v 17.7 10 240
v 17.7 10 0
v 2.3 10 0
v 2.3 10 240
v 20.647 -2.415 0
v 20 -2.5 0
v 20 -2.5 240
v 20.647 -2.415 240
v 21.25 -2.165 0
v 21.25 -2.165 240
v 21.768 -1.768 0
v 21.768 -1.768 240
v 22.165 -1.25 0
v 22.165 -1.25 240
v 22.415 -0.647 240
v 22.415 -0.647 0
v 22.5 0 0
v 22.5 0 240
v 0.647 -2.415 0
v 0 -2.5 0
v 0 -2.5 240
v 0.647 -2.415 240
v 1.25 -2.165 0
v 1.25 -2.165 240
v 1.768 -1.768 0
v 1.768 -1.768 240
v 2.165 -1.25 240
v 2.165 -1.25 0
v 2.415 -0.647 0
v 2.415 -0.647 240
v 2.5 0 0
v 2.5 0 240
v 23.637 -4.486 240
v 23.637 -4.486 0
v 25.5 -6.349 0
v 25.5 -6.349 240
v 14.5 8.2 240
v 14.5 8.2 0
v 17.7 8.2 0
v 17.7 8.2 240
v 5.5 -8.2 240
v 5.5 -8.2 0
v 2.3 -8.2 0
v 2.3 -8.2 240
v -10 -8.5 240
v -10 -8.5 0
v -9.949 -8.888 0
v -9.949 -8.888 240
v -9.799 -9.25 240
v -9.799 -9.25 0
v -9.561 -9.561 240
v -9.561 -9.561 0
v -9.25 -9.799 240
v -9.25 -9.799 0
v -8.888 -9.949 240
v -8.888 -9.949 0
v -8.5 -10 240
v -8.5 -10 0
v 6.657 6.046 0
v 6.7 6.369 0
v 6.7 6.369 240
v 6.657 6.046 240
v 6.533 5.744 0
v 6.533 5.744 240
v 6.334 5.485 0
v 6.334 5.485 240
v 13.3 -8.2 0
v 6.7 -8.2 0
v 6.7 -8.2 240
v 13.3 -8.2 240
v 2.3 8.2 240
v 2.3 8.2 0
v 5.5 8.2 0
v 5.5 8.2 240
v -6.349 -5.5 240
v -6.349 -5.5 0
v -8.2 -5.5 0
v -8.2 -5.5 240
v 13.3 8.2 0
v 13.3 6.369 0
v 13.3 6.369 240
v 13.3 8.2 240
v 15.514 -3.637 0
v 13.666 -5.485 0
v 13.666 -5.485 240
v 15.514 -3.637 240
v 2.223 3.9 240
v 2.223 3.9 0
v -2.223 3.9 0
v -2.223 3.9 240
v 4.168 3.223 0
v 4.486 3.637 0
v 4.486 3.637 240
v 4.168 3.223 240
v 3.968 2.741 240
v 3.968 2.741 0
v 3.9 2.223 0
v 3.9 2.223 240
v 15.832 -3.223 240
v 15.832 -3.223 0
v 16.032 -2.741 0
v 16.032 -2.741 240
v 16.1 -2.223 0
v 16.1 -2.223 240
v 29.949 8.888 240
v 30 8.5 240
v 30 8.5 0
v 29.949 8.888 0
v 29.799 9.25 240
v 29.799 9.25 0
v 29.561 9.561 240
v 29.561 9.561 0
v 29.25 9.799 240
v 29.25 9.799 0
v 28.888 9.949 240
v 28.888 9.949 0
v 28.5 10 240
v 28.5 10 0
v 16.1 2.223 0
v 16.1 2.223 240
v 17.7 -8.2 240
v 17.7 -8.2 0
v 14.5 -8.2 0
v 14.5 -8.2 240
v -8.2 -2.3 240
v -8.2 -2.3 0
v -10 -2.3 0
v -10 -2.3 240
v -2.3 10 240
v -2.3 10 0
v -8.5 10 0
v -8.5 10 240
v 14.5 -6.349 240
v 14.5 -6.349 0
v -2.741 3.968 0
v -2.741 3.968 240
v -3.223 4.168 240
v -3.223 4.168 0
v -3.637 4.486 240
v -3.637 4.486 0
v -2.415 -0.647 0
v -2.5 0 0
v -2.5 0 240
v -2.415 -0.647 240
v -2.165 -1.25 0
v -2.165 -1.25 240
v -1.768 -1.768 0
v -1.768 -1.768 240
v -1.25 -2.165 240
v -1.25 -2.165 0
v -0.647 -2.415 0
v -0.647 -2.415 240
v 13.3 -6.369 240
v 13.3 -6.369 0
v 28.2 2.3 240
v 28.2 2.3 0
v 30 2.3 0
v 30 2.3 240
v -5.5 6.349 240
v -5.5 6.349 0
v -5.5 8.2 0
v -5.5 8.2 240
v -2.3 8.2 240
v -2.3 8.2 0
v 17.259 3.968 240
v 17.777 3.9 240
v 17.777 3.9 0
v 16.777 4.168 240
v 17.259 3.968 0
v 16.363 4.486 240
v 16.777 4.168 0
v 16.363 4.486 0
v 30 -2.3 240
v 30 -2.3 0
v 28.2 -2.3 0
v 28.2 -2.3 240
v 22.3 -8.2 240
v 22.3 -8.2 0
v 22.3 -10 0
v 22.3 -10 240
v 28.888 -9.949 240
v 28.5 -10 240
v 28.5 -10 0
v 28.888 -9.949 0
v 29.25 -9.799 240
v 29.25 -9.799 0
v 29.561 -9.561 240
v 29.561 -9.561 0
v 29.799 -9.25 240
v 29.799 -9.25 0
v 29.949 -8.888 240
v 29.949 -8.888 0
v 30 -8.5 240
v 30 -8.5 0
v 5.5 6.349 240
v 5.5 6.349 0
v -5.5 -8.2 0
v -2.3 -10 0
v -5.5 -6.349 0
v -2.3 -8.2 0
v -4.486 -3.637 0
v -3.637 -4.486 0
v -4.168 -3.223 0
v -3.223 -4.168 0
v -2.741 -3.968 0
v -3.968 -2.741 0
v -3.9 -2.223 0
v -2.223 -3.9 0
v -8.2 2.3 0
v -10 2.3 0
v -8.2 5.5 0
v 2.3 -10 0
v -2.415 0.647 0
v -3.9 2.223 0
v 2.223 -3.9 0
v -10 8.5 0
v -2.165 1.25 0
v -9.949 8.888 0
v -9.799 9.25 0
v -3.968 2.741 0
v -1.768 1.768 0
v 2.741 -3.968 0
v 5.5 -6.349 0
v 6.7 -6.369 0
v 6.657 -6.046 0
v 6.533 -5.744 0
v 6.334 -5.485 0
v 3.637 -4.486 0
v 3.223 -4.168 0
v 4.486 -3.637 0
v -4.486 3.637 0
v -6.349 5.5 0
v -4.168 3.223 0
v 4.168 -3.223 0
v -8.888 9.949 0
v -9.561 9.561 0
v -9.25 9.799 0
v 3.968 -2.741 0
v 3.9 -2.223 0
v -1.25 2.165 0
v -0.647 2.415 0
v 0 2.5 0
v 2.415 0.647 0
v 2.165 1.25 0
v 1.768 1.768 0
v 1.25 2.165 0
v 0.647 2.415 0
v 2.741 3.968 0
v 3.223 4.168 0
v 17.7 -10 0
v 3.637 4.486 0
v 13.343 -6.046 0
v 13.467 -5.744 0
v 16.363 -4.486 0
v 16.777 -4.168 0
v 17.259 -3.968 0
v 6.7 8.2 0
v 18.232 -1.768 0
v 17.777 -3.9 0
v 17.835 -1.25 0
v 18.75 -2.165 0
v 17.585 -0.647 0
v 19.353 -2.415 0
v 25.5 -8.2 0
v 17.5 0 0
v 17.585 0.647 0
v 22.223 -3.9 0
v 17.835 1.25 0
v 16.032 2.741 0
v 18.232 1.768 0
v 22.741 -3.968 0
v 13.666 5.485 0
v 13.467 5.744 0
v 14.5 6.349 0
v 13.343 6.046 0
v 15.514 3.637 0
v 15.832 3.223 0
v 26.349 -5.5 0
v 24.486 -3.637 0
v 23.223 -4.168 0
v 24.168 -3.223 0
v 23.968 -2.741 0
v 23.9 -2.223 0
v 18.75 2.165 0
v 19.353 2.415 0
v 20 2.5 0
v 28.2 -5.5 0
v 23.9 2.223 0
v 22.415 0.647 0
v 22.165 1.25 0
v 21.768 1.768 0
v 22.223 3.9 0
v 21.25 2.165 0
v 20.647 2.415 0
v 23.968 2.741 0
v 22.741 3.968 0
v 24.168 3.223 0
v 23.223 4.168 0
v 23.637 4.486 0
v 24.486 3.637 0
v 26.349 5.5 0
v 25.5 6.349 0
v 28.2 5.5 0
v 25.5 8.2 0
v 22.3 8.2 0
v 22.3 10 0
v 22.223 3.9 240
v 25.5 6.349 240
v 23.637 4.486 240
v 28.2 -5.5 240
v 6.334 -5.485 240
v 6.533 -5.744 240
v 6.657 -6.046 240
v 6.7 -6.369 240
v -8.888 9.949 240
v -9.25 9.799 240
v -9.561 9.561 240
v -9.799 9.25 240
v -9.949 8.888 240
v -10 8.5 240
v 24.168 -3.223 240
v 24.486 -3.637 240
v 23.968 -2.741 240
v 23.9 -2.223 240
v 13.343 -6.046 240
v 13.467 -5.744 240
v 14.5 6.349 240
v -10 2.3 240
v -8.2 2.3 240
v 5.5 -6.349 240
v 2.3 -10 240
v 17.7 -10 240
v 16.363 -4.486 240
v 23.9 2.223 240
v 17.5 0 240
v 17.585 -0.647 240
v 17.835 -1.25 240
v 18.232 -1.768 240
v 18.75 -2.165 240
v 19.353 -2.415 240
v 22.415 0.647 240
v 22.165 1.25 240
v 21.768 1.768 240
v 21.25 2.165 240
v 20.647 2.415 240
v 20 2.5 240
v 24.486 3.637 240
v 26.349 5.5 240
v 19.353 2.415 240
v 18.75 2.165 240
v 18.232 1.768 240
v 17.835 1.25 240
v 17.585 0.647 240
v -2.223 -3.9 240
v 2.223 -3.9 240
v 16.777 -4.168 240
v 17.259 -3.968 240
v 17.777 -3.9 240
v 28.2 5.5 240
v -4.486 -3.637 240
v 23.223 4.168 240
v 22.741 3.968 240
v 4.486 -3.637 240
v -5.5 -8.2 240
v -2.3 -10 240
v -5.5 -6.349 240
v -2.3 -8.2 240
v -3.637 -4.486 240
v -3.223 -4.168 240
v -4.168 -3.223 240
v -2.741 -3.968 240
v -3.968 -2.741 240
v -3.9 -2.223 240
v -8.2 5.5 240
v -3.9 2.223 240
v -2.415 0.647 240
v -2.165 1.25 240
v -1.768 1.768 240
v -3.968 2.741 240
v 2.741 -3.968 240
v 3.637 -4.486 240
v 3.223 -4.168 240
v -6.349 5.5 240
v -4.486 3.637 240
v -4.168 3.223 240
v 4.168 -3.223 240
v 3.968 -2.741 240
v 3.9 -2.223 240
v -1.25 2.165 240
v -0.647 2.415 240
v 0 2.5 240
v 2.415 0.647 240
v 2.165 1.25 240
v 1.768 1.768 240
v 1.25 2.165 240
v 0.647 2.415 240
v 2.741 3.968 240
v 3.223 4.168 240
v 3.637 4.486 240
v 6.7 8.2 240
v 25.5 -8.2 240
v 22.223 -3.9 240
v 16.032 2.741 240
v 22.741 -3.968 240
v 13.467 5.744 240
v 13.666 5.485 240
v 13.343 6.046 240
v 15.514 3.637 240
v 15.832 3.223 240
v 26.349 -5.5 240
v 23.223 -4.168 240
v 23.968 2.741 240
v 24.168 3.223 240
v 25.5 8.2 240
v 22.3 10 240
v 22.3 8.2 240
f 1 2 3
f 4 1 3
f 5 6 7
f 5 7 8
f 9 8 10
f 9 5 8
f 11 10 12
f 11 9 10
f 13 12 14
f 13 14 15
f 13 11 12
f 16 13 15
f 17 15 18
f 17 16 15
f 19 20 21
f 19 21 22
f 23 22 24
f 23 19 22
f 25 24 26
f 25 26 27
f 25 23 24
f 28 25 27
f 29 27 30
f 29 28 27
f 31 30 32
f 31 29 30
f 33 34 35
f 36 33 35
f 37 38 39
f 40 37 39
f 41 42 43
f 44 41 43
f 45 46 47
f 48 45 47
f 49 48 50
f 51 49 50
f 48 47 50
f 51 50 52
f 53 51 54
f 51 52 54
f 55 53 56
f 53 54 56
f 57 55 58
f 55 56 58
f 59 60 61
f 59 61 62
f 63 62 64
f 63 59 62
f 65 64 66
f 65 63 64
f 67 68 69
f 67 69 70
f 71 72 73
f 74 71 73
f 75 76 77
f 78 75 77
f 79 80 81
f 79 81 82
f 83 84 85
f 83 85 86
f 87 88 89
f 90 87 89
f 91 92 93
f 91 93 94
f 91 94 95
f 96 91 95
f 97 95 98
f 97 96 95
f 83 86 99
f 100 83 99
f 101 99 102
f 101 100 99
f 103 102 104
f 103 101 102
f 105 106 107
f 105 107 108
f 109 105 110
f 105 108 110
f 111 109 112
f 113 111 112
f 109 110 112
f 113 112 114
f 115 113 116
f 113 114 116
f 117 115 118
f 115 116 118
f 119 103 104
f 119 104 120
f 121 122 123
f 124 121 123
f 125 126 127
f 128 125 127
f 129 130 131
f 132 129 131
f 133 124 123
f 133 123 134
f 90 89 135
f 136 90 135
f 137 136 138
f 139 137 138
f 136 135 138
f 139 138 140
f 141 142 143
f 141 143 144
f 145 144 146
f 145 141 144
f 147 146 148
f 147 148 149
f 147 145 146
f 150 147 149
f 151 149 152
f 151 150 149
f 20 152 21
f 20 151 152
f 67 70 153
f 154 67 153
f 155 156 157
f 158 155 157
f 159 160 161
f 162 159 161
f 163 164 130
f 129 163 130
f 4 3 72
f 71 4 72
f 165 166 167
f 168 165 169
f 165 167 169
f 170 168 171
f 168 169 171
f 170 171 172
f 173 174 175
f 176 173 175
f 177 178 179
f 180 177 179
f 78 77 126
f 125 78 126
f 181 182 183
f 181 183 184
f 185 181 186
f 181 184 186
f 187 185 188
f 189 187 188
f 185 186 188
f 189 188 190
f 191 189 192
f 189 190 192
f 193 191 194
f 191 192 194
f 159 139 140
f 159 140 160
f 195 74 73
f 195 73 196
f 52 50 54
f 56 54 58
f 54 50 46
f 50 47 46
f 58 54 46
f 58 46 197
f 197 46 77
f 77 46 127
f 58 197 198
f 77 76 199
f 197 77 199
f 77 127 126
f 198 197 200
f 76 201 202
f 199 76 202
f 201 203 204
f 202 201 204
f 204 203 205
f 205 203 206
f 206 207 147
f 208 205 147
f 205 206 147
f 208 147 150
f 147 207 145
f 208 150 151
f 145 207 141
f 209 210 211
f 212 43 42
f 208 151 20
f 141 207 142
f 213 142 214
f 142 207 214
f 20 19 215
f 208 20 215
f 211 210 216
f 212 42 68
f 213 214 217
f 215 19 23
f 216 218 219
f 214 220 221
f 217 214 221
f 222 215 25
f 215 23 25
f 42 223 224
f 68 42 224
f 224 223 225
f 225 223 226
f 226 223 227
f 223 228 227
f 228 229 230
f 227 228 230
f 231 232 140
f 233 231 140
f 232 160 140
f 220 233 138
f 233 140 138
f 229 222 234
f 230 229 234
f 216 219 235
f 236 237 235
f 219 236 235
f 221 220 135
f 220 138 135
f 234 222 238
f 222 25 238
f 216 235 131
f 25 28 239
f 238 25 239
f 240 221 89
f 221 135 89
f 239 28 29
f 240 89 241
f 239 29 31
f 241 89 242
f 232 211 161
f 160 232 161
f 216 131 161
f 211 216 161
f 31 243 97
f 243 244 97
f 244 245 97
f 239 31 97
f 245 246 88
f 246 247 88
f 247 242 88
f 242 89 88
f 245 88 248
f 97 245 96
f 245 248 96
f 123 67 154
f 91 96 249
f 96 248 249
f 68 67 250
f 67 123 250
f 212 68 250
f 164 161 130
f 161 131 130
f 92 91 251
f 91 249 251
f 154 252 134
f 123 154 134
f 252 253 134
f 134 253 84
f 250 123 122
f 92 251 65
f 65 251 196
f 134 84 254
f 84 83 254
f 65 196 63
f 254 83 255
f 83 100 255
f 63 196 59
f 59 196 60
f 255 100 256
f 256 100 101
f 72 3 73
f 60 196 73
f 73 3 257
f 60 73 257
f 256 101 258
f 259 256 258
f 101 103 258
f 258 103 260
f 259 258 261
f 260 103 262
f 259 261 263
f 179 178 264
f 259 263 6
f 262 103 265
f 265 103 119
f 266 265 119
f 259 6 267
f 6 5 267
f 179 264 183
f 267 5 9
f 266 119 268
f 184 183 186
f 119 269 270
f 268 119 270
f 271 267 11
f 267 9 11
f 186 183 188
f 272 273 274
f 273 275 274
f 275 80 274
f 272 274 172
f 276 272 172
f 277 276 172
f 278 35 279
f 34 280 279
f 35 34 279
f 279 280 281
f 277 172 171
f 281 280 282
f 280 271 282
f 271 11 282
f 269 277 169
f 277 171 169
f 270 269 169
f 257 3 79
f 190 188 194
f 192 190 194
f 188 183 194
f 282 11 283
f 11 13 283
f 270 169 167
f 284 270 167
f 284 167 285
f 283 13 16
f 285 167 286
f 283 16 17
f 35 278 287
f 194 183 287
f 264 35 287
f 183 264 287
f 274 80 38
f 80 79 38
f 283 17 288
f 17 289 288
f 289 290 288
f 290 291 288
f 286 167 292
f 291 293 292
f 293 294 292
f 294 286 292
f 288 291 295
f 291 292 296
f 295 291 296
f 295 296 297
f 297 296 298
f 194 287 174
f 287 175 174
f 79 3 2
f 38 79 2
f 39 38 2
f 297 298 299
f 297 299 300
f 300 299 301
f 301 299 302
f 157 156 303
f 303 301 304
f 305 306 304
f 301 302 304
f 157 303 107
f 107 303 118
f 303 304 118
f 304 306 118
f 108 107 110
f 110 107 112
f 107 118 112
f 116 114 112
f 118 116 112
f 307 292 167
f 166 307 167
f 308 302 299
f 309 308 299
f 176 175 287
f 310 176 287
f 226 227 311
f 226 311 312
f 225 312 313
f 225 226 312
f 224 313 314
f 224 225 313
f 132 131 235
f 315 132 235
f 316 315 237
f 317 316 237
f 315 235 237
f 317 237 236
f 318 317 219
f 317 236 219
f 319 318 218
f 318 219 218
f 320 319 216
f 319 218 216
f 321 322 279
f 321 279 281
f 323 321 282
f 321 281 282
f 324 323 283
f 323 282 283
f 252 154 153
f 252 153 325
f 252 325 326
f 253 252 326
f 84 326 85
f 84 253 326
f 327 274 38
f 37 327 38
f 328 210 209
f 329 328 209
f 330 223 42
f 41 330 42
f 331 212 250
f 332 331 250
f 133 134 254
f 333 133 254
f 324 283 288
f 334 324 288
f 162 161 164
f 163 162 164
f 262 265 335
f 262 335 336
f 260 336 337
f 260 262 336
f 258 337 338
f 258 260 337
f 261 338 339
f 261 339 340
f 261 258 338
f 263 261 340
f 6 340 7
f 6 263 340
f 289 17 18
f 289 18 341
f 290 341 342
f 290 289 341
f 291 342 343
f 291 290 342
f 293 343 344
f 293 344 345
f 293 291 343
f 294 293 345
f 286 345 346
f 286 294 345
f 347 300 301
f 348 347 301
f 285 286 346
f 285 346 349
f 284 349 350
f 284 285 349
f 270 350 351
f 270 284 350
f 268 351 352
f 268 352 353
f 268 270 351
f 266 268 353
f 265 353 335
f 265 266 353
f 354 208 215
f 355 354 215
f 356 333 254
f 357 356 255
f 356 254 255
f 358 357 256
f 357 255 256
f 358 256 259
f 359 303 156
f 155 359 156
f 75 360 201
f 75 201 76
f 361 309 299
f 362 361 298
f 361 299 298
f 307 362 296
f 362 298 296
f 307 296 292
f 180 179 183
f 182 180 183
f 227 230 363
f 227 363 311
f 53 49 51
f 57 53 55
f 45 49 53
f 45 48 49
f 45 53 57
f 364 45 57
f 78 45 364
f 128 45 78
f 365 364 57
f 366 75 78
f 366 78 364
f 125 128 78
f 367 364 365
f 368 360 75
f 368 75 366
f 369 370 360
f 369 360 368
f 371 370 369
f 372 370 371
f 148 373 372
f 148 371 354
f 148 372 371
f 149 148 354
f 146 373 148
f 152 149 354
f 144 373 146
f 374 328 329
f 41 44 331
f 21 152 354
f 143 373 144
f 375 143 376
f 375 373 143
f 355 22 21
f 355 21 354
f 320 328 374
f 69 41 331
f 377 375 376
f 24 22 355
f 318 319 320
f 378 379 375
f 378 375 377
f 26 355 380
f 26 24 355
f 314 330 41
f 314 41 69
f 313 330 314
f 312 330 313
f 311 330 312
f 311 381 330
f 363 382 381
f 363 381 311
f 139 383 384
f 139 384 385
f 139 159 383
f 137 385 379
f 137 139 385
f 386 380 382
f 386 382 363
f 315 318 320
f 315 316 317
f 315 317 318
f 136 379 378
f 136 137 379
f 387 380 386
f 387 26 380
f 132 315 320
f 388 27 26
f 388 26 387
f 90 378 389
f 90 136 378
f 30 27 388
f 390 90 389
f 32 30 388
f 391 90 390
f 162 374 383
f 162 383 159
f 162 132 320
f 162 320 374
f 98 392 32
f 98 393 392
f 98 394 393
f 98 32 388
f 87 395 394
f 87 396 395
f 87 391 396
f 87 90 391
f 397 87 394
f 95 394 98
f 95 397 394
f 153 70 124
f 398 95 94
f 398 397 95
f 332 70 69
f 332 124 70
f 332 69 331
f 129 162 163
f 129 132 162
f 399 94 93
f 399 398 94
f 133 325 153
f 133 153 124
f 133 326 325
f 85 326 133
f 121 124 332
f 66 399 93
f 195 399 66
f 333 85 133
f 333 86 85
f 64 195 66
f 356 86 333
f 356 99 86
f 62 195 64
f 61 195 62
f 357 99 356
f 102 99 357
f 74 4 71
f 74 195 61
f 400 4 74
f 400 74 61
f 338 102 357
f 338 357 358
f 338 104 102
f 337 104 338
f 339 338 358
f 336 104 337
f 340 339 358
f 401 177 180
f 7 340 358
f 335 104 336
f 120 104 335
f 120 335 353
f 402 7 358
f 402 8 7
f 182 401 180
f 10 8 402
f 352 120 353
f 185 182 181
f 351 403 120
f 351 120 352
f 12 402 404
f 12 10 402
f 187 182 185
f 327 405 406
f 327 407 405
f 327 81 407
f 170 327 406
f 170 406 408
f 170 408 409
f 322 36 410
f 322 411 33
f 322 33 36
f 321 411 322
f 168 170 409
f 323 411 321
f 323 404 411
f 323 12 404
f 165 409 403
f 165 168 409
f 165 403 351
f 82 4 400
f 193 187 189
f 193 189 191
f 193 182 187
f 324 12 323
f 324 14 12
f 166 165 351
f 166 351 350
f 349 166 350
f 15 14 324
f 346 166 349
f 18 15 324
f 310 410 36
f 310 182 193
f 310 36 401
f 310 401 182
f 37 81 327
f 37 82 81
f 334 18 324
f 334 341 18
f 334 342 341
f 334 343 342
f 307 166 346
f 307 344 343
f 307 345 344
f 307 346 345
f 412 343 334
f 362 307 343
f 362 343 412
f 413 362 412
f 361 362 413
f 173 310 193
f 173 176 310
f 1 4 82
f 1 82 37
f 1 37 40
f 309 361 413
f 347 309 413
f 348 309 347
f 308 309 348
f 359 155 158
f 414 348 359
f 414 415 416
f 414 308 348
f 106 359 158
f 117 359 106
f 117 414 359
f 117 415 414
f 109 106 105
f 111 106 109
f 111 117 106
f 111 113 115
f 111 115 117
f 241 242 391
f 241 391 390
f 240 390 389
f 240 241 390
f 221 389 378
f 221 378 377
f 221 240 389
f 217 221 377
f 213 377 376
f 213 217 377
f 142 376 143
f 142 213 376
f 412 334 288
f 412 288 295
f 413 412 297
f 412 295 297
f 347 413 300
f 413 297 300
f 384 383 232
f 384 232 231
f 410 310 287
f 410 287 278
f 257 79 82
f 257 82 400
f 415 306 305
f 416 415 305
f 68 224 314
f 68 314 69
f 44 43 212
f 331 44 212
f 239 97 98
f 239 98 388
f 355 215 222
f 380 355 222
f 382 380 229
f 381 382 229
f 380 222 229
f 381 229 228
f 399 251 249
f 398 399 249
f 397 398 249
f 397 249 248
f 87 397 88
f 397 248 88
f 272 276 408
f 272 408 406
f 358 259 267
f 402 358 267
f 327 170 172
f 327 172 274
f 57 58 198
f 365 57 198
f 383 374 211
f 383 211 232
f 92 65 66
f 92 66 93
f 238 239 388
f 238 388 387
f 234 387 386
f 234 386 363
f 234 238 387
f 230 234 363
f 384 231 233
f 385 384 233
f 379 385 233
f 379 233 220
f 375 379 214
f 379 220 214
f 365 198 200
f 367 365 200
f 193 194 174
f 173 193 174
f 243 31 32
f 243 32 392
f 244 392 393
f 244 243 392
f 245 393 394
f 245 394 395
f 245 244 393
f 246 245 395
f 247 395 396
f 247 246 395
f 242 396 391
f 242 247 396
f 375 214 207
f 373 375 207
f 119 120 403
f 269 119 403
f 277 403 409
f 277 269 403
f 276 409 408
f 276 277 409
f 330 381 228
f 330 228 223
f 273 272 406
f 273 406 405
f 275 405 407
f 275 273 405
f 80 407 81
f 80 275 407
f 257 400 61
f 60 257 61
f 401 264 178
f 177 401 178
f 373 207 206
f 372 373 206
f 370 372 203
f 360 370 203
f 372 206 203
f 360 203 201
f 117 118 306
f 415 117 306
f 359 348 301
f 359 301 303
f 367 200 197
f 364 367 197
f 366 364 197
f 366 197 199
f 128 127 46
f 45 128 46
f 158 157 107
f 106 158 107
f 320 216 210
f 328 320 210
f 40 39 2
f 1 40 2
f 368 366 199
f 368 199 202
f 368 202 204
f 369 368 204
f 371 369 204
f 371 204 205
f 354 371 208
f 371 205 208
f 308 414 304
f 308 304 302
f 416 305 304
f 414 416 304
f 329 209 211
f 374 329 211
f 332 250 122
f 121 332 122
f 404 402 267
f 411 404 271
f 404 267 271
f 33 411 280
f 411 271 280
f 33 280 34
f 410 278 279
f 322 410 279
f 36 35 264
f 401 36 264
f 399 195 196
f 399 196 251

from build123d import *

# Parameters (mm, degrees)
SALIENTE_EXTRUIR1_DEPTH = 240


with BuildPart() as part:
    # Croquis1 → Saliente-Extruir1 (new body)
    with BuildSketch(Plane.XY):
        with BuildLine():
            Line((-10, 8.5), (-10, 2.3))
            Line((-10, 2.3), (-8.2, 2.3))
            Line((-8.2, 2.3), (-8.2, 5.5))
            Line((-8.2, 5.5), (-6.348528137, 5.5))
            Line((-6.348528137, 5.5), (-4.485786438, 3.6372583))
            ThreePointArc((-4.485786438, 3.6372583), (-4.052240935, 2.988411603), (-3.9, 2.223044738))
            Line((-3.9, 2.223044738), (-3.9, 0))
            Line((-3.9, 0), (-3.9, -2.223044738))
            ThreePointArc((-3.9, -2.223044738), (-4.052240935, -2.988411603), (-4.485786438, -3.6372583))
            Line((-4.485786438, -3.6372583), (-6.348528137, -5.5))
            Line((-6.348528137, -5.5), (-8.2, -5.5))
            Line((-8.2, -5.5), (-8.2, -2.3))
            Line((-8.2, -2.3), (-10, -2.3))
            Line((-10, -2.3), (-10, -8.5))
            ThreePointArc((-10, -8.5), (-9.560660172, -9.560660172), (-8.5, -10))
            Line((-8.5, -10), (-2.3, -10))
            Line((-2.3, -10), (-2.3, -8.2))
            Line((-2.3, -8.2), (-5.5, -8.2))
            Line((-5.5, -8.2), (-5.5, -6.348528137))
            Line((-5.5, -6.348528137), (-3.6372583, -4.485786438))
            ThreePointArc((-3.6372583, -4.485786438), (-2.988411603, -4.052240935), (-2.223044738, -3.9))
            Line((-2.223044738, -3.9), (0, -3.9))
            Line((0, -3.9), (2.223044738, -3.9))
            ThreePointArc((2.223044738, -3.9), (2.988411603, -4.052240935), (3.6372583, -4.485786438))
            Line((3.6372583, -4.485786438), (5.5, -6.348528137))
            Line((5.5, -6.348528137), (5.5, -8.2))
            Line((5.5, -8.2), (2.3, -8.2))
            Line((2.3, -8.2), (2.3, -10))
            Line((2.3, -10), (17.7, -10))
            Line((17.7, -10), (17.7, -8.2))
            Line((17.7, -8.2), (14.5, -8.2))
            Line((14.5, -8.2), (14.5, -6.348528137))
            Line((14.5, -6.348528137), (16.3627417, -4.485786438))
            ThreePointArc((16.3627417, -4.485786438), (17.011588397, -4.052240935), (17.776955262, -3.9))
            Line((17.776955262, -3.9), (20, -3.9))
            Line((20, -3.9), (22.223044738, -3.9))
            ThreePointArc((22.223044738, -3.9), (22.988411603, -4.052240935), (23.6372583, -4.485786438))
            Line((23.6372583, -4.485786438), (25.5, -6.348528137))
            Line((25.5, -6.348528137), (25.5, -8.2))
            Line((25.5, -8.2), (22.3, -8.2))
            Line((22.3, -8.2), (22.3, -10))
            Line((22.3, -10), (28.5, -10))
            ThreePointArc((28.5, -10), (29.560660172, -9.560660172), (30, -8.5))
            Line((30, -8.5), (30, -2.3))
            Line((30, -2.3), (28.2, -2.3))
            Line((28.2, -2.3), (28.2, -5.5))
            Line((28.2, -5.5), (26.348528137, -5.5))
            Line((26.348528137, -5.5), (24.485786438, -3.6372583))
            ThreePointArc((24.485786438, -3.6372583), (24.052240935, -2.988411603), (23.9, -2.223044738))
            Line((23.9, -2.223044738), (23.9, 0))
            Line((23.9, 0), (23.9, 2.223044738))
            ThreePointArc((23.9, 2.223044738), (24.052240935, 2.988411603), (24.485786438, 3.6372583))
            Line((24.485786438, 3.6372583), (26.348528137, 5.5))
            Line((26.348528137, 5.5), (28.2, 5.5))
            Line((28.2, 5.5), (28.2, 2.3))
            Line((28.2, 2.3), (30, 2.3))
            Line((30, 2.3), (30, 8.5))
            ThreePointArc((30, 8.5), (29.560660172, 9.560660172), (28.5, 10))
            Line((28.5, 10), (22.3, 10))
            Line((22.3, 10), (22.3, 8.2))
            Line((22.3, 8.2), (25.5, 8.2))
            Line((25.5, 8.2), (25.5, 6.348528137))
            Line((25.5, 6.348528137), (23.6372583, 4.485786438))
            ThreePointArc((23.6372583, 4.485786438), (22.988411603, 4.052240935), (22.223044738, 3.9))
            Line((22.223044738, 3.9), (20, 3.9))
            Line((20, 3.9), (17.776955262, 3.9))
            ThreePointArc((17.776955262, 3.9), (17.011588397, 4.052240935), (16.3627417, 4.485786438))
            Line((16.3627417, 4.485786438), (14.5, 6.348528137))
            Line((14.5, 6.348528137), (14.5, 8.2))
            Line((14.5, 8.2), (17.7, 8.2))
            Line((17.7, 8.2), (17.7, 10))
            Line((17.7, 10), (2.3, 10))
            Line((2.3, 10), (2.3, 8.2))
            Line((2.3, 8.2), (5.5, 8.2))
            Line((5.5, 8.2), (5.5, 6.348528137))
            Line((5.5, 6.348528137), (3.6372583, 4.485786438))
            ThreePointArc((3.6372583, 4.485786438), (2.988411603, 4.052240935), (2.223044738, 3.9))
            Line((2.223044738, 3.9), (0, 3.9))
            Line((0, 3.9), (-2.223044738, 3.9))
            ThreePointArc((-2.223044738, 3.9), (-2.988411603, 4.052240935), (-3.6372583, 4.485786438))
            Line((-3.6372583, 4.485786438), (-5.5, 6.348528137))
            Line((-5.5, 6.348528137), (-5.5, 8.2))
            Line((-5.5, 8.2), (-2.3, 8.2))
            Line((-2.3, 8.2), (-2.3, 10))
            Line((-2.3, 10), (-8.5, 10))
            ThreePointArc((-8.5, 10), (-9.560660172, 9.560660172), (-10, 8.5))
        make_face()
        with BuildLine():
            Line((3.9, 2.223044738), (3.9, 0))
            Line((3.9, 0), (3.9, -2.223044738))
            ThreePointArc((3.9, -2.223044738), (4.052240935, -2.988411603), (4.485786438, -3.6372583))
            Line((4.485786438, -3.6372583), (6.333883476, -5.485355339))
            ThreePointArc((6.333883476, -5.485355339), (6.604849416, -5.890884525), (6.7, -6.369238816))
            Line((6.7, -6.369238816), (6.7, -8.2))
            Line((6.7, -8.2), (13.3, -8.2))
            Line((13.3, -8.2), (13.3, -6.369238816))
            ThreePointArc((13.3, -6.369238816), (13.395150584, -5.890884525), (13.666116524, -5.485355339))
            Line((13.666116524, -5.485355339), (15.514213562, -3.6372583))
            ThreePointArc((15.514213562, -3.6372583), (15.947759065, -2.988411603), (16.1, -2.223044738))
            Line((16.1, -2.223044738), (16.1, 0))
            Line((16.1, 0), (16.1, 2.223044738))
            ThreePointArc((16.1, 2.223044738), (15.947759065, 2.988411603), (15.514213562, 3.6372583))
            Line((15.514213562, 3.6372583), (13.666116524, 5.485355339))
            ThreePointArc((13.666116524, 5.485355339), (13.395150584, 5.890884525), (13.3, 6.369238816))
            Line((13.3, 6.369238816), (13.3, 8.2))
            Line((13.3, 8.2), (6.7, 8.2))
            Line((6.7, 8.2), (6.7, 6.369238816))
            ThreePointArc((6.7, 6.369238816), (6.604849416, 5.890884525), (6.333883476, 5.485355339))
            Line((6.333883476, 5.485355339), (4.485786438, 3.6372583))
            ThreePointArc((4.485786438, 3.6372583), (4.052240935, 2.988411603), (3.9, 2.223044738))
        make_face(mode=Mode.SUBTRACT)
        with BuildLine():
            ThreePointArc((0, 2.5), (-1.767766953, 1.767766953), (-2.5, 0))
            ThreePointArc((-2.5, 0), (-1.767766953, -1.767766953), (0, -2.5))
            ThreePointArc((0, -2.5), (1.767766953, -1.767766953), (2.5, 0))
            ThreePointArc((2.5, 0), (1.767766953, 1.767766953), (0, 2.5))
        make_face(mode=Mode.SUBTRACT)
        with BuildLine():
            ThreePointArc((20, 2.5), (18.232233047, 1.767766953), (17.5, 0))
            ThreePointArc((17.5, 0), (18.232233047, -1.767766953), (20, -2.5))
            ThreePointArc((20, -2.5), (21.767766953, -1.767766953), (22.5, 0))
            ThreePointArc((22.5, 0), (21.767766953, 1.767766953), (20, 2.5))
        make_face(mode=Mode.SUBTRACT)
    extrude(amount=SALIENTE_EXTRUIR1_DEPTH)


solid = part.part
